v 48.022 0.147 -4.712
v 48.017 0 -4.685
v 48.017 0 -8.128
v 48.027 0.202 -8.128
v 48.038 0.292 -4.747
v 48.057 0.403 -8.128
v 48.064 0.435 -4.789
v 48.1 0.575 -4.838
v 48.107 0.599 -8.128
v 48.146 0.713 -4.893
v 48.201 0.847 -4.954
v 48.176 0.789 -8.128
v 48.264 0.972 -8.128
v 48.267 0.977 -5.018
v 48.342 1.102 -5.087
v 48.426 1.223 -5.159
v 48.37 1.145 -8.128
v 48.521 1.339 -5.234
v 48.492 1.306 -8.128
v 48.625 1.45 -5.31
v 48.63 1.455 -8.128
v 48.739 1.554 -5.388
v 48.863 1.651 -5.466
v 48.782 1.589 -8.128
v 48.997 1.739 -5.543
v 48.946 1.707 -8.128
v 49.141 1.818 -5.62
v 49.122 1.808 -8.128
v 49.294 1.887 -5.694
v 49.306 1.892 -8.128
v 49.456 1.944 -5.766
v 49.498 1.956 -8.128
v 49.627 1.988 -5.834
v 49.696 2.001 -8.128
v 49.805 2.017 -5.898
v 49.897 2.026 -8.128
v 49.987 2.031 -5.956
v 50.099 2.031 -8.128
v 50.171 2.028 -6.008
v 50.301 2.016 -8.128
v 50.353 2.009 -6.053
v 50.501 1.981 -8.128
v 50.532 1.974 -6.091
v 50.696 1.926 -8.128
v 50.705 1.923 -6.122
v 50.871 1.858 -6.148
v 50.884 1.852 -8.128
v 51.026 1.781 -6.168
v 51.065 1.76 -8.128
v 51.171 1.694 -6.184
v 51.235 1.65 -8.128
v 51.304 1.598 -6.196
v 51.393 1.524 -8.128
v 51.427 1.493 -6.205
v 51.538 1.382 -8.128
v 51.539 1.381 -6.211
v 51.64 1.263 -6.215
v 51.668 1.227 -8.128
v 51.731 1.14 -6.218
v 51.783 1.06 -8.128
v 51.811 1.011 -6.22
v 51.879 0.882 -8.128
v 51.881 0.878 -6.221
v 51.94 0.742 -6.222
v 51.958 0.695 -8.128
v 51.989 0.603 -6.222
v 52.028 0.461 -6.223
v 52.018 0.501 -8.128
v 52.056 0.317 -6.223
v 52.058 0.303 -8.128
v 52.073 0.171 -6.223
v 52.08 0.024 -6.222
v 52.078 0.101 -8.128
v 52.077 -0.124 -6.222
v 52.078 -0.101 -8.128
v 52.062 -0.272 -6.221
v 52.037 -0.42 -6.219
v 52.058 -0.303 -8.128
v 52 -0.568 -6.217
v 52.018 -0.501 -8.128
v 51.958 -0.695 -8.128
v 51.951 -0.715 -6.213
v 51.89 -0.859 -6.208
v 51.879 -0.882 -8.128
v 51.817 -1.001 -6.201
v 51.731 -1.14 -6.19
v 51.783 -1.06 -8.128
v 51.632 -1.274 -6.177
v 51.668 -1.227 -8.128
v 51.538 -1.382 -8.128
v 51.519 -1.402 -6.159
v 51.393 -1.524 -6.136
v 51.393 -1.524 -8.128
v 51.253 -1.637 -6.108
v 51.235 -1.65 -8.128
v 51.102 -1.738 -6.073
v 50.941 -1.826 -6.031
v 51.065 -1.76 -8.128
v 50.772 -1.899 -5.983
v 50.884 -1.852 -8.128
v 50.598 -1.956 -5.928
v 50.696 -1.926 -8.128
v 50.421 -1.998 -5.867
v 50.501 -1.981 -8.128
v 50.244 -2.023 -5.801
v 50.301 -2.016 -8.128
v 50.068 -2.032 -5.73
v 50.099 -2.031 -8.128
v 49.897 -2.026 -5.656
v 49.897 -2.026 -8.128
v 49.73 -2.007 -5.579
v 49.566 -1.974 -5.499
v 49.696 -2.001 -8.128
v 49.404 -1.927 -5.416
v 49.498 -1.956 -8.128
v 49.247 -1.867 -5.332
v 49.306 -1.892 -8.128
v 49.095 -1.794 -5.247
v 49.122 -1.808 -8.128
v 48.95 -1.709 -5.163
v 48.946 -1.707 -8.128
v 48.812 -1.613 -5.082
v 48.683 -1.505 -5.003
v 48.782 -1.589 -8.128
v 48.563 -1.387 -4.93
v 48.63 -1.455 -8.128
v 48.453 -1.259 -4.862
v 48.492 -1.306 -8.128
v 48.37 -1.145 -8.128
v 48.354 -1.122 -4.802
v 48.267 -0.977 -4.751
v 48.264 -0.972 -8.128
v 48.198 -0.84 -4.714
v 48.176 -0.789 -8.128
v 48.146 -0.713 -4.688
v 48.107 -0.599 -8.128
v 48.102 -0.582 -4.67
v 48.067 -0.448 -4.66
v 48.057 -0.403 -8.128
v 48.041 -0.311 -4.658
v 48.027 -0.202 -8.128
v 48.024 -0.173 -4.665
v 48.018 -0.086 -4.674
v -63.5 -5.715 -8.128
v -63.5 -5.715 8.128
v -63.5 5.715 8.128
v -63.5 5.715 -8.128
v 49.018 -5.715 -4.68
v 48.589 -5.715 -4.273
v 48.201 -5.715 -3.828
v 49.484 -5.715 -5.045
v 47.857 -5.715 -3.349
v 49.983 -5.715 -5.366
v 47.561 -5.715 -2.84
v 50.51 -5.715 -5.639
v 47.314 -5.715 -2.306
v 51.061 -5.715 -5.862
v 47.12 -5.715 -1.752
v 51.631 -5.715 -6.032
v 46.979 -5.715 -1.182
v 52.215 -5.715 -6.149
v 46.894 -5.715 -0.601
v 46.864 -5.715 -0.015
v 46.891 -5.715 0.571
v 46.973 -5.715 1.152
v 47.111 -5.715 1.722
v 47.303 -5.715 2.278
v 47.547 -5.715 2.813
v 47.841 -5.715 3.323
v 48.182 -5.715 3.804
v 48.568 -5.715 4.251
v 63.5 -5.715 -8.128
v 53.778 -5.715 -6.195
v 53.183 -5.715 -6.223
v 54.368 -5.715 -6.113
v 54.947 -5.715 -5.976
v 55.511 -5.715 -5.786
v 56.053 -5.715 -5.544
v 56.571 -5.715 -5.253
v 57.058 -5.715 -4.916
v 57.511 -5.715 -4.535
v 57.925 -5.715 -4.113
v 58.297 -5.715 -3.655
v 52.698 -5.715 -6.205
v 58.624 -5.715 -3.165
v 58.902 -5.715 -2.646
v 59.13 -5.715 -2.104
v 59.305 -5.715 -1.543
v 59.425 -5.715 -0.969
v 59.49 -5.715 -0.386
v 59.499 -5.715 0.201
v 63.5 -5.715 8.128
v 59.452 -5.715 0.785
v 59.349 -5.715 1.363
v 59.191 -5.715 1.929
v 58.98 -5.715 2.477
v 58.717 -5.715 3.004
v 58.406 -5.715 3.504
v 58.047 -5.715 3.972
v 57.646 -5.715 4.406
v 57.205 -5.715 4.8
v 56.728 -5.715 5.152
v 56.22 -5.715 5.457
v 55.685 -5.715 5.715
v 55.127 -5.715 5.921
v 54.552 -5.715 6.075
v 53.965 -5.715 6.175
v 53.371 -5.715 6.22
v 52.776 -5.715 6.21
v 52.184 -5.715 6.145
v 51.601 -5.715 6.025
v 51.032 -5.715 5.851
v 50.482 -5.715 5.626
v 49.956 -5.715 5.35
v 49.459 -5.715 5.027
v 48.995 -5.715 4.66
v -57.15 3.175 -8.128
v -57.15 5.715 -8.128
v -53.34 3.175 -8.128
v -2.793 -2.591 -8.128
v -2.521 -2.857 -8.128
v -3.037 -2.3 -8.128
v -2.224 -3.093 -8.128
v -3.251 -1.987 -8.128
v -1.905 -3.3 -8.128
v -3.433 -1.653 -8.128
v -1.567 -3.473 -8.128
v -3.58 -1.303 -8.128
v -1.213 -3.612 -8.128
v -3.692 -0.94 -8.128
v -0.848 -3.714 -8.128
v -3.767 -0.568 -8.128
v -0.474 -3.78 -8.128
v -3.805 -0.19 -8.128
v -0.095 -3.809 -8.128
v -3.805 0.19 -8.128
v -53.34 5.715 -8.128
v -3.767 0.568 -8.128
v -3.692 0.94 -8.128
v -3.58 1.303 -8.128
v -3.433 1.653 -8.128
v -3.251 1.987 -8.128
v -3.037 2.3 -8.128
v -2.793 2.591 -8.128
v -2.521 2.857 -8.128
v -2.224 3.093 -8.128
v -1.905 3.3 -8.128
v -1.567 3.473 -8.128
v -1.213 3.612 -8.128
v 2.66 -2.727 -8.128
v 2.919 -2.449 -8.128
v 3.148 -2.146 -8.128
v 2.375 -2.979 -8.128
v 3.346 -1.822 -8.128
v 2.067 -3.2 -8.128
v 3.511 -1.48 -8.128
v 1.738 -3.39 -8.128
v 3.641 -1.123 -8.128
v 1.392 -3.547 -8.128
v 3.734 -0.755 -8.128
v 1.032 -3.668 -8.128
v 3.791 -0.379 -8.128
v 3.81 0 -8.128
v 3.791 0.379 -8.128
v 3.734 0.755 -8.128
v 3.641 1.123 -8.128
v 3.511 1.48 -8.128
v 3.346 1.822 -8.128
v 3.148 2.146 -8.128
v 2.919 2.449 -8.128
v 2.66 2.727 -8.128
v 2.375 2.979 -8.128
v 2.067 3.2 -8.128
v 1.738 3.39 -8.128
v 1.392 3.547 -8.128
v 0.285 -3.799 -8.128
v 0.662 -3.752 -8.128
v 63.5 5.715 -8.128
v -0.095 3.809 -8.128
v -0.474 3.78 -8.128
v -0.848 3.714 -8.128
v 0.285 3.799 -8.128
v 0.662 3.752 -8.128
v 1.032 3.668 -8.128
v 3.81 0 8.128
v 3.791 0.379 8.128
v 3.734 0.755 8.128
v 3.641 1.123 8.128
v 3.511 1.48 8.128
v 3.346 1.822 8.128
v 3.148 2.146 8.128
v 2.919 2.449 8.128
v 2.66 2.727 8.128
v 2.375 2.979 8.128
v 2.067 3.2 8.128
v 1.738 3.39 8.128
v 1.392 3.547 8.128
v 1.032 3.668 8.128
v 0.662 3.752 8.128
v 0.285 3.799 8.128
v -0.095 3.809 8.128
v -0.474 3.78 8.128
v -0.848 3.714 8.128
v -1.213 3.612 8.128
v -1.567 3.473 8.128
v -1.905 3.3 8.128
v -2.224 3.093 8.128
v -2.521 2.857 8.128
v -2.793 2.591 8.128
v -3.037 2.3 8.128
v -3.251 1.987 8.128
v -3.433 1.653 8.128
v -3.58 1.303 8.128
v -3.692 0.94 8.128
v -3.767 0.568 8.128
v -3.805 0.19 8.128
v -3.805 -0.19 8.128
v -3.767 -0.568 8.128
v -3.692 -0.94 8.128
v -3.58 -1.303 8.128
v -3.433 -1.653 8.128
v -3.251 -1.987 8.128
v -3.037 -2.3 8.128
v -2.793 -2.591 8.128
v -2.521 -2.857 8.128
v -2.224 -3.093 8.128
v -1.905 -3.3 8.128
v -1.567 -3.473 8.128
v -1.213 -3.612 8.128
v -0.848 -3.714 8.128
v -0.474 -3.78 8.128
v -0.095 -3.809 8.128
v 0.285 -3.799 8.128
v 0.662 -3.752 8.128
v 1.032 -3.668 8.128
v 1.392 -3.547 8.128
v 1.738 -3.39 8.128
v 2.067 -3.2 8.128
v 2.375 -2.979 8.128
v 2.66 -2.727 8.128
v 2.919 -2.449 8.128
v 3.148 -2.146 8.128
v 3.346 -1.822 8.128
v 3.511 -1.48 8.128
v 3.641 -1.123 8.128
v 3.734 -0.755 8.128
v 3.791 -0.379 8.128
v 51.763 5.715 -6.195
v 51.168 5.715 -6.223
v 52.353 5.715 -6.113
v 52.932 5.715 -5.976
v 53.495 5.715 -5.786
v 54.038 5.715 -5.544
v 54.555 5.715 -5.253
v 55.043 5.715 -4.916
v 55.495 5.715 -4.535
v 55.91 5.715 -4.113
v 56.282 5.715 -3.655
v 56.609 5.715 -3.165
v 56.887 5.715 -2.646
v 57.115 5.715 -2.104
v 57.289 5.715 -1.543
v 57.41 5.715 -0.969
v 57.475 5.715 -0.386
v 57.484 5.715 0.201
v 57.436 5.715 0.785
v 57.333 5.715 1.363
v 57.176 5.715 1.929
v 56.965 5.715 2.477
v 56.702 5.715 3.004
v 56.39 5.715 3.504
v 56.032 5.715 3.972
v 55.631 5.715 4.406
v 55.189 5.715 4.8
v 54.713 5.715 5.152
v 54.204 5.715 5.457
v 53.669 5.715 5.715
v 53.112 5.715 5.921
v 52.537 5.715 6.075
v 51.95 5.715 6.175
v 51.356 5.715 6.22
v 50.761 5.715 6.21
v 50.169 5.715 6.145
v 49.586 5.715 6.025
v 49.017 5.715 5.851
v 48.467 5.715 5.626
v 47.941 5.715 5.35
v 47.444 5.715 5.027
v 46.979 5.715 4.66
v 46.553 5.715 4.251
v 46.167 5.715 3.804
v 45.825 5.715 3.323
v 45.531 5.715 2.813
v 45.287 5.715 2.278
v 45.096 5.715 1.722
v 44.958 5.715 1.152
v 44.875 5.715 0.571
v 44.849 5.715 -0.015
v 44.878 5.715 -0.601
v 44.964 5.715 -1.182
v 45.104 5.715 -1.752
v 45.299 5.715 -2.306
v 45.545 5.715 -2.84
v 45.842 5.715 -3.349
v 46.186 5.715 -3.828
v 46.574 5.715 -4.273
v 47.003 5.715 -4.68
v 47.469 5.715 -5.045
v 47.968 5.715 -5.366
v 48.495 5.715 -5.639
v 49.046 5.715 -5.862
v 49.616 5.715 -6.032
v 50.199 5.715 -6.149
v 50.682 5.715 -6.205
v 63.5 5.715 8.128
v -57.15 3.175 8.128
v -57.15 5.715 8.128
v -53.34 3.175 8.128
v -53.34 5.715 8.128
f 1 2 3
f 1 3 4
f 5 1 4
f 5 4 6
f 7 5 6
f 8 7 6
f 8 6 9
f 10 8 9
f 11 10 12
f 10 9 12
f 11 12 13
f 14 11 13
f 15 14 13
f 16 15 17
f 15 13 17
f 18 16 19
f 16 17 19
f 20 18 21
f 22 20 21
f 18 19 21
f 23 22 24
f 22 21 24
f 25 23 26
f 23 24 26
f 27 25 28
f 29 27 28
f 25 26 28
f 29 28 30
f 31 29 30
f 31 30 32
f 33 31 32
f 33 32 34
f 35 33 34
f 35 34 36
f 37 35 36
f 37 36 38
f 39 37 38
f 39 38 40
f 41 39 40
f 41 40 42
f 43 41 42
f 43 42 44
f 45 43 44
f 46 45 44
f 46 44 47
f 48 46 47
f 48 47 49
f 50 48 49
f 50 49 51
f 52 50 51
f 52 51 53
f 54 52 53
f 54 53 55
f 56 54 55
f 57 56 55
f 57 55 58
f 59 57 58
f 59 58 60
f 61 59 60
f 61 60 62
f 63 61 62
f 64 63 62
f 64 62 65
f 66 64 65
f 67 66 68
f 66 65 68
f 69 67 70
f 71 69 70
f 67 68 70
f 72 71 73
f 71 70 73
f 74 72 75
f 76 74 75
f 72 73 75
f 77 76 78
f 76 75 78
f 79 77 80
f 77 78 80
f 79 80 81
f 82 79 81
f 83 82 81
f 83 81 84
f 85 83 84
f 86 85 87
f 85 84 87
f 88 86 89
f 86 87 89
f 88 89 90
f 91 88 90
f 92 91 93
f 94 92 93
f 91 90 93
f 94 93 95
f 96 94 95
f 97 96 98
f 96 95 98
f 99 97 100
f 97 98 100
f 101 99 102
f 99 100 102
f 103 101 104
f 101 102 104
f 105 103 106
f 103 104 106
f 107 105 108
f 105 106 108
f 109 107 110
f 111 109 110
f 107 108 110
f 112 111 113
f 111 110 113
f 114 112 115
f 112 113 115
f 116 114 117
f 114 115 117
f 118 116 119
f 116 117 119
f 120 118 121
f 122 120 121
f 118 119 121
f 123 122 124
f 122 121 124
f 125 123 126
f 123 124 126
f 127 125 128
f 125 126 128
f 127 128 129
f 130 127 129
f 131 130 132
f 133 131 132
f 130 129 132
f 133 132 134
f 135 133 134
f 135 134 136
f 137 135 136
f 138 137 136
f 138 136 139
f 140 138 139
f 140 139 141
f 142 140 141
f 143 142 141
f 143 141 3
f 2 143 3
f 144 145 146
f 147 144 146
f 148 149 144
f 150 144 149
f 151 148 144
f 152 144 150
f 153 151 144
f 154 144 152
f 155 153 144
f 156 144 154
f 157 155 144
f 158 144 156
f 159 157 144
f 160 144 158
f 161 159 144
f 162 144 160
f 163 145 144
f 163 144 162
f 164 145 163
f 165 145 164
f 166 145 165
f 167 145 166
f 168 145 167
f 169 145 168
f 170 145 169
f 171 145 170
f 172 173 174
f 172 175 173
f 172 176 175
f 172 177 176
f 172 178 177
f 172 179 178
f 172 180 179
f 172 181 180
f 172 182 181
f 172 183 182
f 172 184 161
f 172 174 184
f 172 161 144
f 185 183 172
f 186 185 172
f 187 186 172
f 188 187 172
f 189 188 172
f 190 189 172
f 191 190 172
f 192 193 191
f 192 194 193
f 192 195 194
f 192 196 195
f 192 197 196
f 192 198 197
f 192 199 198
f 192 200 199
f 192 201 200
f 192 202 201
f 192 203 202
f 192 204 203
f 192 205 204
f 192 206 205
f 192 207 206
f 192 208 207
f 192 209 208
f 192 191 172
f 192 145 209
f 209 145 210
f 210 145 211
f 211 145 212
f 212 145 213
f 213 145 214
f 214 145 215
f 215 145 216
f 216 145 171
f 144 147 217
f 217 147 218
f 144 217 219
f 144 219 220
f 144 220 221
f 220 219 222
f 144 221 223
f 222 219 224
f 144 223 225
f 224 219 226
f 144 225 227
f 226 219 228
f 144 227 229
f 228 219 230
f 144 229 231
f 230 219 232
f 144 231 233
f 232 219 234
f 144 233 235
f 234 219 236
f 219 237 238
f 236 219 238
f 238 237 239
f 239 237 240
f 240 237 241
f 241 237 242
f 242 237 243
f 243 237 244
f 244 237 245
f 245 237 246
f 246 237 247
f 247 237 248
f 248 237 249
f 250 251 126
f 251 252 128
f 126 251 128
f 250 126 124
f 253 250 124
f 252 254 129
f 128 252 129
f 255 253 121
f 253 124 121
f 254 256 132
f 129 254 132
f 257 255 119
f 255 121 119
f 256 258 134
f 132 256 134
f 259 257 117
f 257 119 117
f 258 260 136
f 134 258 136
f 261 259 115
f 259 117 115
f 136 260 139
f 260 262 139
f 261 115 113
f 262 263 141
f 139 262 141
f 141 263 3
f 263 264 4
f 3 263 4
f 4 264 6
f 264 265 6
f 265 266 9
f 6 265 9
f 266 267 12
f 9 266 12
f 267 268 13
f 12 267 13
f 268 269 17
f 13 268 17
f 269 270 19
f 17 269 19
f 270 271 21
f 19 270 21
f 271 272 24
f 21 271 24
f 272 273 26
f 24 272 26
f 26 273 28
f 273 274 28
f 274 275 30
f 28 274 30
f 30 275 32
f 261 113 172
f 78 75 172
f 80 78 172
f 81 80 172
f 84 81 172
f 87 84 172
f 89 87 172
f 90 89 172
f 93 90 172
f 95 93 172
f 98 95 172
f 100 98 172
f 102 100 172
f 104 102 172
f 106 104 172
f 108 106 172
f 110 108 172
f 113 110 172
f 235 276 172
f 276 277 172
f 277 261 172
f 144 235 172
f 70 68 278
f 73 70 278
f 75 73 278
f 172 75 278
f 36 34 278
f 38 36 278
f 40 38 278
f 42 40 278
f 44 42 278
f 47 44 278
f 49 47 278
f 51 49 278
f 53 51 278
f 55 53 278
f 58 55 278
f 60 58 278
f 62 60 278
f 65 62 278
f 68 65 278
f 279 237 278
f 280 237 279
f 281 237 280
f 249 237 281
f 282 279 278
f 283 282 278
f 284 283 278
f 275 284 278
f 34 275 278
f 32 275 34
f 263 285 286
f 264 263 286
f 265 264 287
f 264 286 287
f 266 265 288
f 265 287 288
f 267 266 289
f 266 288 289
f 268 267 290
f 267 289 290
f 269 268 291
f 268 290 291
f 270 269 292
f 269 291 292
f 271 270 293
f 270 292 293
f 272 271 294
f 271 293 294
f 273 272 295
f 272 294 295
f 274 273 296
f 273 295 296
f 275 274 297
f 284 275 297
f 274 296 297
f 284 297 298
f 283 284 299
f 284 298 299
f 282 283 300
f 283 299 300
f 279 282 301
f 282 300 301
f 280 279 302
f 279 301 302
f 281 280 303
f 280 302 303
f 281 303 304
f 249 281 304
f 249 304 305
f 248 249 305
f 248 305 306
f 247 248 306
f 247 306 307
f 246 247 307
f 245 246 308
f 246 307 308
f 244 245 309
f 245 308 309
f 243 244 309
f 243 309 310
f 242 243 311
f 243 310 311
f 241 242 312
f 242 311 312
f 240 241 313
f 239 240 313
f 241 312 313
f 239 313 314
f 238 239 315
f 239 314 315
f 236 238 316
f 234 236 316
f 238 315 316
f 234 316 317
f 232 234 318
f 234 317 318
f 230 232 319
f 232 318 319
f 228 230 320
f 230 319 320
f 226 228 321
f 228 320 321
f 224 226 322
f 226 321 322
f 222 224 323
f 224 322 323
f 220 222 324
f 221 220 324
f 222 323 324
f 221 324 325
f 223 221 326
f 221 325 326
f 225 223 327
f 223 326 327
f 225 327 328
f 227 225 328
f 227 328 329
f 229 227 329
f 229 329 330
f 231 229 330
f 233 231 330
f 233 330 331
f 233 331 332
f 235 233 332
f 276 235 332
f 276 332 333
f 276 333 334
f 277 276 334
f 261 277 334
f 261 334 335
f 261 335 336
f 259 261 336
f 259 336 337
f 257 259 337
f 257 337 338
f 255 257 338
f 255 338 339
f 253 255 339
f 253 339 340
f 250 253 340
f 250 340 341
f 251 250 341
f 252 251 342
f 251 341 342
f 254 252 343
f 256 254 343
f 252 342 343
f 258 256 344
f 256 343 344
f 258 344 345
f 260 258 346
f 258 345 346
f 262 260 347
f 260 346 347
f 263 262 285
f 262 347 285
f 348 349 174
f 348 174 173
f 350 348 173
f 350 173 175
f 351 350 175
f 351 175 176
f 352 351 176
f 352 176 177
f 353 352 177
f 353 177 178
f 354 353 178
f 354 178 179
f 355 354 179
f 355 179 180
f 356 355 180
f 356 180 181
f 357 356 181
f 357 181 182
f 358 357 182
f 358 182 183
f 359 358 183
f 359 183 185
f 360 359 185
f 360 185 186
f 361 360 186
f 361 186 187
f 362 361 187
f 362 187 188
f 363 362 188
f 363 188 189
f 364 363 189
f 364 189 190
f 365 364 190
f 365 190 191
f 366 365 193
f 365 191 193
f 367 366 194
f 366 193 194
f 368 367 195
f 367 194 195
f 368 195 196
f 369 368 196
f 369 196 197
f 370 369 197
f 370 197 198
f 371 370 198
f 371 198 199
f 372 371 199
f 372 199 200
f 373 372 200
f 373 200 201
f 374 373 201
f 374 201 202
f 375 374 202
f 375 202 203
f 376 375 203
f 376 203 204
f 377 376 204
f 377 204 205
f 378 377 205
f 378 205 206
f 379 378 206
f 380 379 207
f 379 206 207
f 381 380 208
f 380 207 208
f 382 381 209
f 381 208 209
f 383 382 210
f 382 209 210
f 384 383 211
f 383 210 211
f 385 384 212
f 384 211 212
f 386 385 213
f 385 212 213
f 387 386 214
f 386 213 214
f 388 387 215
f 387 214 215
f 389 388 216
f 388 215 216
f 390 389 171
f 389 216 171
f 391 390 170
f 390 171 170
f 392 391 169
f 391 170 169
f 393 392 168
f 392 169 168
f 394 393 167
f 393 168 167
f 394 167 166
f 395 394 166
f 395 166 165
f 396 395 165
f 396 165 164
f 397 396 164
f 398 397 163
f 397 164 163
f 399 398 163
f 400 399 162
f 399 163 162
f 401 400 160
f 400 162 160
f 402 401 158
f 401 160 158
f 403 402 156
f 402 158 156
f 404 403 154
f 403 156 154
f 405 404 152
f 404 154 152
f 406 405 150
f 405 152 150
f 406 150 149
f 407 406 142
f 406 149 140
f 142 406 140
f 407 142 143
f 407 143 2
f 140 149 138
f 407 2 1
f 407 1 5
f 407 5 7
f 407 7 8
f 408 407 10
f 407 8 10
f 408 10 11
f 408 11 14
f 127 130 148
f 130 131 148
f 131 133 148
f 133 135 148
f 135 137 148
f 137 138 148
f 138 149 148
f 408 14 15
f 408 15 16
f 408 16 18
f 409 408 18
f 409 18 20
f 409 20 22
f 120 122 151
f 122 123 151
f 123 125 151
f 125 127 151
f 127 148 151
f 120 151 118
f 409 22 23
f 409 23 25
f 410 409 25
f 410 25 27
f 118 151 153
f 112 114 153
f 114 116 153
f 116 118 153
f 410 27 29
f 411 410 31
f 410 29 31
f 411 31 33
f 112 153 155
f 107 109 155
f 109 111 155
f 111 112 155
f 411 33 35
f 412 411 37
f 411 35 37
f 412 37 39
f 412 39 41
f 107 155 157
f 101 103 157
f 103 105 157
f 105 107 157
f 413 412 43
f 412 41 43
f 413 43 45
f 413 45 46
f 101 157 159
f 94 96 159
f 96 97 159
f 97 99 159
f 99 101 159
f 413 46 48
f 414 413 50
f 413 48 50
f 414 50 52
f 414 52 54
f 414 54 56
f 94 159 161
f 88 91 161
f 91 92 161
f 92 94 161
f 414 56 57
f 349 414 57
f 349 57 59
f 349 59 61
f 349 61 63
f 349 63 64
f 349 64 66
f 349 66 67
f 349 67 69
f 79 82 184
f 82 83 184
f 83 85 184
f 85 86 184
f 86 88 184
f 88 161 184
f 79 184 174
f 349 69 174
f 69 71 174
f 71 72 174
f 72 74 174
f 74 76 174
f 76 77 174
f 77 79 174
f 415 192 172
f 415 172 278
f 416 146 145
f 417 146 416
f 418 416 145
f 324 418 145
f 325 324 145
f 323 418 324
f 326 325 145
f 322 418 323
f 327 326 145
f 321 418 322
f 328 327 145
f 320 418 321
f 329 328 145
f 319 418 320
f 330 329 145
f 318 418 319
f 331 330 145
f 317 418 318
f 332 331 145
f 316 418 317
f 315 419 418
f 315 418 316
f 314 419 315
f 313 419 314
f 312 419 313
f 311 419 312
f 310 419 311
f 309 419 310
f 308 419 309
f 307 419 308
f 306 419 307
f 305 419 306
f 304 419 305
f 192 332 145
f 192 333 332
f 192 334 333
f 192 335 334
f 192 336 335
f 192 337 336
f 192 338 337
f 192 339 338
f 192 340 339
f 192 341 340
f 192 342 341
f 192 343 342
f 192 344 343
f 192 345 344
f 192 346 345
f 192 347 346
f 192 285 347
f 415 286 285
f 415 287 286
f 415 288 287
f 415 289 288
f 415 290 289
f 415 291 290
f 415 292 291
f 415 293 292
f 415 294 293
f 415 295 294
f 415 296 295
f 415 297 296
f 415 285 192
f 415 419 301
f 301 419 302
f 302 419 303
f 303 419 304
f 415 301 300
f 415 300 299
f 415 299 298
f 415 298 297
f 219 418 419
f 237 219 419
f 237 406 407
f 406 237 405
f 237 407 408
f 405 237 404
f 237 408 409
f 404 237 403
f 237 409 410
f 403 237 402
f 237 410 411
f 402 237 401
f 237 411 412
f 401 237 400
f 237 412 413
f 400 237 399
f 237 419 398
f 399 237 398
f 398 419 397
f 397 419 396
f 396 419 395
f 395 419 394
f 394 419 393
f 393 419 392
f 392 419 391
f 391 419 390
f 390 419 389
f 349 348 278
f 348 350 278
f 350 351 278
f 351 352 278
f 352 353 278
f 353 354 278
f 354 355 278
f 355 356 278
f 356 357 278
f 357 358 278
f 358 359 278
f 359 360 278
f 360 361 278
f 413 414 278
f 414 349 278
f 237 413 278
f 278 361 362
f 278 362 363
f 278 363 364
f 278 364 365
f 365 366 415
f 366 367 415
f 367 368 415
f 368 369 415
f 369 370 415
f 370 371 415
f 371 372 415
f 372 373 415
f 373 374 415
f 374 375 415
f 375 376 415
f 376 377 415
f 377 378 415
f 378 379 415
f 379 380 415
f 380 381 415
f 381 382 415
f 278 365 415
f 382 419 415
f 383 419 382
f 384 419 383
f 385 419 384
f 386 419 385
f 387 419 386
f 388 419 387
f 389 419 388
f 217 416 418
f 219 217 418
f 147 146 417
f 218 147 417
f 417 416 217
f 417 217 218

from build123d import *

# Parameters (mm, degrees)
SKETCH1_W           = 127
SKETCH1_H           = 11.43
BOSS_EXTRUDE1_DEPTH = 8.128
SKETCH6_W           = 3.81
SKETCH6_H           = 2.54
CUT_EXTRUDE1_DEPTH  = 16.256
SKETCH12_R          = 3.81
CUT_EXTRUDE2_DEPTH  = 16.256
SKETCH14_R          = 6.223
CUT_EXTRUDE3_DEPTH  = 25.4
CUT_EXTRUDE4_REACH  = 18.256
SKETCH17_R          = 2.032


with BuildPart() as part:
    # Sketch1 → Boss-Extrude1 (new body, symmetric)
    with BuildSketch(Plane.XY):
        Rectangle(SKETCH1_W, SKETCH1_H)
    extrude(amount=BOSS_EXTRUDE1_DEPTH, both=True)

    # Sketch6 → Cut-Extrude1 (cut)
    with BuildSketch(Plane.XY.offset(8.128)):
        with Locations((-55.245, 4.445)):
            Rectangle(SKETCH6_W, SKETCH6_H)
    extrude(amount=-CUT_EXTRUDE1_DEPTH, mode=Mode.SUBTRACT)

    # Sketch12 → Cut-Extrude2 (cut)
    with BuildSketch(Plane.XY.offset(8.128)):
        Circle(SKETCH12_R)
    extrude(amount=-CUT_EXTRUDE2_DEPTH, mode=Mode.SUBTRACT)

    # Sketch14 → Cut-Extrude3 (cut)
    with BuildSketch(Plane(origin=(2.89208185, -16.401811214, 0), x_dir=(0, 0, -1), z_dir=(0.173648178, -0.984807753, 0))):
        with Locations((0, 51.382892981)):
            Circle(SKETCH14_R)
    extrude(amount=-CUT_EXTRUDE3_DEPTH, mode=Mode.SUBTRACT)

    # Sketch17 → Cut-Extrude4 (cut, up to next)
    with BuildSketch(Plane(origin=(0, 0, -8.128), x_dir=(-1, 0, 0), z_dir=(0, 0, -1)), mode=Mode.PRIVATE) as cut_extrude4_sk1:
        with Locations((-50.048620668, 0)):
            Circle(SKETCH17_R)
    cut_extrude4_tool1 = extrude(cut_extrude4_sk1.sketch, amount=-CUT_EXTRUDE4_REACH, mode=Mode.PRIVATE) & part.part
    add(cut_extrude4_tool1.solids().sort_by_distance((50.048621, 0, -8.128))[0], mode=Mode.SUBTRACT)


solid = part.part
